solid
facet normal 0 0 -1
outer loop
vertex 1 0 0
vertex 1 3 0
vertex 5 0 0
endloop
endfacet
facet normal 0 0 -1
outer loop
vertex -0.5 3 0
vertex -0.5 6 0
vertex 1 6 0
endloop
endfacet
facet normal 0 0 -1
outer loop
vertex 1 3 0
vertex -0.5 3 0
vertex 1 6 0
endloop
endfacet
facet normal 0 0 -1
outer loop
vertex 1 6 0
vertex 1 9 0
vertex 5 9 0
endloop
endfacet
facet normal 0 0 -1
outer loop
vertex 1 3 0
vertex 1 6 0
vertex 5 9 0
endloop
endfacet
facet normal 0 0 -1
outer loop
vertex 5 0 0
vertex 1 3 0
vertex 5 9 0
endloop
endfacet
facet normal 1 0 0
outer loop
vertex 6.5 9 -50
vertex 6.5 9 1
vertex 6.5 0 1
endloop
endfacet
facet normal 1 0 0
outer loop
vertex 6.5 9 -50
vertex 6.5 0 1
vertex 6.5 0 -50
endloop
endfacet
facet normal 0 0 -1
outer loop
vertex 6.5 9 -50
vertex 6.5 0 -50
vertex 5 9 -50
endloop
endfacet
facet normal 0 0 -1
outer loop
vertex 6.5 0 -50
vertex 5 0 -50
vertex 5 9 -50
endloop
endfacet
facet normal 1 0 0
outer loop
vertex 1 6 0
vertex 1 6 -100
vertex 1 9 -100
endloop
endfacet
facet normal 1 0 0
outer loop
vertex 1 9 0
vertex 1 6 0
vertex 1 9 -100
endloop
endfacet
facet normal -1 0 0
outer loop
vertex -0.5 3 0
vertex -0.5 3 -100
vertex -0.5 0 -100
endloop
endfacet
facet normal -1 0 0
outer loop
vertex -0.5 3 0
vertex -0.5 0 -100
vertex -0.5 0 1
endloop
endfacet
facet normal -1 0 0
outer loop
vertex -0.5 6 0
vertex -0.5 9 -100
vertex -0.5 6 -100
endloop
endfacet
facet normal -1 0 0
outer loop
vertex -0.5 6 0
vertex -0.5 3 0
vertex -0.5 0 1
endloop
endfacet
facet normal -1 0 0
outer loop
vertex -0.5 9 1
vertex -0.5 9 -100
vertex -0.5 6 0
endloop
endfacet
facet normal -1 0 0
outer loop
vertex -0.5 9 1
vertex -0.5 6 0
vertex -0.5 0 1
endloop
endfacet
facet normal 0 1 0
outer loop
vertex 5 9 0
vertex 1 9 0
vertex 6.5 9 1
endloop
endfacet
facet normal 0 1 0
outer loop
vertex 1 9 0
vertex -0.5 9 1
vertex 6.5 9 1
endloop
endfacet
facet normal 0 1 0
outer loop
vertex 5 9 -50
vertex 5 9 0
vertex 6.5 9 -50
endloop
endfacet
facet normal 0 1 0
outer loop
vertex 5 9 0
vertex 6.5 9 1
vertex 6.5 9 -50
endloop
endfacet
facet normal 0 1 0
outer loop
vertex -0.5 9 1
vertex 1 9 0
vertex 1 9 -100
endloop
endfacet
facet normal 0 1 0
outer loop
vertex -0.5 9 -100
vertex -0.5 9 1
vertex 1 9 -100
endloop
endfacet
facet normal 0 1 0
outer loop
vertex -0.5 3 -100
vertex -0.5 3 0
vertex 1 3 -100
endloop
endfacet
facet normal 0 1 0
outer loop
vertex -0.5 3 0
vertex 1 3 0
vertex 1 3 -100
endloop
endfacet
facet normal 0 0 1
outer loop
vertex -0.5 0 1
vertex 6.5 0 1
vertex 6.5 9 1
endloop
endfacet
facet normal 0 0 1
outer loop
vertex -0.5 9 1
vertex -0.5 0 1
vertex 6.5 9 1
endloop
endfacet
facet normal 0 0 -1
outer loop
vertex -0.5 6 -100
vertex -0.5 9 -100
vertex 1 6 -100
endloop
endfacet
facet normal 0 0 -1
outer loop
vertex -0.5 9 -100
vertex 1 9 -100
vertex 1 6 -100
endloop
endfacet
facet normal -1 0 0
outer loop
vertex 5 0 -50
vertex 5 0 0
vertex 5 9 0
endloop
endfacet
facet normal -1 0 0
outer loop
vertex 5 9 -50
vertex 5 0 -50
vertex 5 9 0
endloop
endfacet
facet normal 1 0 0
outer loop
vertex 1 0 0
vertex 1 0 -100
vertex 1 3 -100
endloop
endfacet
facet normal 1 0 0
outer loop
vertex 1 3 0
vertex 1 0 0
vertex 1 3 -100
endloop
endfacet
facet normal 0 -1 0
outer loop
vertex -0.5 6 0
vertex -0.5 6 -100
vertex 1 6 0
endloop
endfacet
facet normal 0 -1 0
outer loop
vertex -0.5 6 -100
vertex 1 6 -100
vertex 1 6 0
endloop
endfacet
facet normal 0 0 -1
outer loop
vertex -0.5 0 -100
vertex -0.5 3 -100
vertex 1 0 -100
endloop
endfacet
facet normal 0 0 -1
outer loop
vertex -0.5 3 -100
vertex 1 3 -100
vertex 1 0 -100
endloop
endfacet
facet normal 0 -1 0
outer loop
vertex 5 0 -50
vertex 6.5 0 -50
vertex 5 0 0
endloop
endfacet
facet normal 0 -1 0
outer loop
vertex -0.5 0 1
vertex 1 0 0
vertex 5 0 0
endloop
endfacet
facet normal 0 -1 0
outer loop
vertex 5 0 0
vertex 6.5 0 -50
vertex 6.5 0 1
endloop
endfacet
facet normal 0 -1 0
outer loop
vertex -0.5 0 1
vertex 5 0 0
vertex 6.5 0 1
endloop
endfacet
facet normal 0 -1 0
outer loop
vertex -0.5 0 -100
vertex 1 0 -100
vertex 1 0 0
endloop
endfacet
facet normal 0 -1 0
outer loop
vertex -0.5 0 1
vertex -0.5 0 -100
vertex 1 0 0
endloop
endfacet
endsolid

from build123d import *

# Parameters (mm, degrees)
SKETCH1_W           = 6
SKETCH1_H           = 9
BOSS_EXTRUDE1_DEPTH = 1
SKETCH2_W           = 1
SKETCH2_H           = 3
BOSS_EXTRUDE2_DEPTH = 100
SKETCH3_W           = 1
SKETCH3_H           = 9
BOSS_EXTRUDE3_DEPTH = 50
SKETCH4_W           = 51
SKETCH4_H           = 9
BOSS_EXTRUDE4_DEPTH = 0.5
BOSS_EXTRUDE5_DEPTH = 0.5


with BuildPart() as part:
    # Sketch1 → Boss-Extrude1 (new body)
    with BuildSketch(Plane.XY):
        with Locations((3, 4.5)):
            Rectangle(SKETCH1_W, SKETCH1_H)
    extrude(amount=BOSS_EXTRUDE1_DEPTH)

    # Sketch2 → Boss-Extrude2 (add)
    with BuildSketch(Plane(origin=(0, 0, 0), x_dir=(-1, 0, 0), z_dir=(0, 0, -1))):
        with Locations((-0.5, 1.5)):
            Rectangle(SKETCH2_W, SKETCH2_H)
        with Locations((-0.5, 7.5)):
            Rectangle(SKETCH2_W, SKETCH2_H)
    extrude(amount=BOSS_EXTRUDE2_DEPTH)

    # Sketch3 → Boss-Extrude3 (add)
    with BuildSketch(Plane(origin=(0, 0, 0), x_dir=(-1, 0, 0), z_dir=(0, 0, -1))):
        with Locations((-5.5, 4.5)):
            Rectangle(SKETCH3_W, SKETCH3_H)
    extrude(amount=BOSS_EXTRUDE3_DEPTH)

    # Sketch4 → Boss-Extrude4 (add)
    with BuildSketch(Plane(origin=(6, 0, 0), x_dir=(0, 0, -1), z_dir=(1, 0, 0))):
        with Locations((24.5, 4.5)):
            Rectangle(SKETCH4_W, SKETCH4_H)
    extrude(amount=BOSS_EXTRUDE4_DEPTH)

    # Sketch5 → Boss-Extrude5 (add)
    with BuildSketch(Plane.ZY):
        Polygon((1, 9), (-100, 9), (-100, 6), (0, 6), (0, 3), (-100, 3), (-100, 0), (1, 0), align=None)
    extrude(amount=BOSS_EXTRUDE5_DEPTH)


solid = part.part
